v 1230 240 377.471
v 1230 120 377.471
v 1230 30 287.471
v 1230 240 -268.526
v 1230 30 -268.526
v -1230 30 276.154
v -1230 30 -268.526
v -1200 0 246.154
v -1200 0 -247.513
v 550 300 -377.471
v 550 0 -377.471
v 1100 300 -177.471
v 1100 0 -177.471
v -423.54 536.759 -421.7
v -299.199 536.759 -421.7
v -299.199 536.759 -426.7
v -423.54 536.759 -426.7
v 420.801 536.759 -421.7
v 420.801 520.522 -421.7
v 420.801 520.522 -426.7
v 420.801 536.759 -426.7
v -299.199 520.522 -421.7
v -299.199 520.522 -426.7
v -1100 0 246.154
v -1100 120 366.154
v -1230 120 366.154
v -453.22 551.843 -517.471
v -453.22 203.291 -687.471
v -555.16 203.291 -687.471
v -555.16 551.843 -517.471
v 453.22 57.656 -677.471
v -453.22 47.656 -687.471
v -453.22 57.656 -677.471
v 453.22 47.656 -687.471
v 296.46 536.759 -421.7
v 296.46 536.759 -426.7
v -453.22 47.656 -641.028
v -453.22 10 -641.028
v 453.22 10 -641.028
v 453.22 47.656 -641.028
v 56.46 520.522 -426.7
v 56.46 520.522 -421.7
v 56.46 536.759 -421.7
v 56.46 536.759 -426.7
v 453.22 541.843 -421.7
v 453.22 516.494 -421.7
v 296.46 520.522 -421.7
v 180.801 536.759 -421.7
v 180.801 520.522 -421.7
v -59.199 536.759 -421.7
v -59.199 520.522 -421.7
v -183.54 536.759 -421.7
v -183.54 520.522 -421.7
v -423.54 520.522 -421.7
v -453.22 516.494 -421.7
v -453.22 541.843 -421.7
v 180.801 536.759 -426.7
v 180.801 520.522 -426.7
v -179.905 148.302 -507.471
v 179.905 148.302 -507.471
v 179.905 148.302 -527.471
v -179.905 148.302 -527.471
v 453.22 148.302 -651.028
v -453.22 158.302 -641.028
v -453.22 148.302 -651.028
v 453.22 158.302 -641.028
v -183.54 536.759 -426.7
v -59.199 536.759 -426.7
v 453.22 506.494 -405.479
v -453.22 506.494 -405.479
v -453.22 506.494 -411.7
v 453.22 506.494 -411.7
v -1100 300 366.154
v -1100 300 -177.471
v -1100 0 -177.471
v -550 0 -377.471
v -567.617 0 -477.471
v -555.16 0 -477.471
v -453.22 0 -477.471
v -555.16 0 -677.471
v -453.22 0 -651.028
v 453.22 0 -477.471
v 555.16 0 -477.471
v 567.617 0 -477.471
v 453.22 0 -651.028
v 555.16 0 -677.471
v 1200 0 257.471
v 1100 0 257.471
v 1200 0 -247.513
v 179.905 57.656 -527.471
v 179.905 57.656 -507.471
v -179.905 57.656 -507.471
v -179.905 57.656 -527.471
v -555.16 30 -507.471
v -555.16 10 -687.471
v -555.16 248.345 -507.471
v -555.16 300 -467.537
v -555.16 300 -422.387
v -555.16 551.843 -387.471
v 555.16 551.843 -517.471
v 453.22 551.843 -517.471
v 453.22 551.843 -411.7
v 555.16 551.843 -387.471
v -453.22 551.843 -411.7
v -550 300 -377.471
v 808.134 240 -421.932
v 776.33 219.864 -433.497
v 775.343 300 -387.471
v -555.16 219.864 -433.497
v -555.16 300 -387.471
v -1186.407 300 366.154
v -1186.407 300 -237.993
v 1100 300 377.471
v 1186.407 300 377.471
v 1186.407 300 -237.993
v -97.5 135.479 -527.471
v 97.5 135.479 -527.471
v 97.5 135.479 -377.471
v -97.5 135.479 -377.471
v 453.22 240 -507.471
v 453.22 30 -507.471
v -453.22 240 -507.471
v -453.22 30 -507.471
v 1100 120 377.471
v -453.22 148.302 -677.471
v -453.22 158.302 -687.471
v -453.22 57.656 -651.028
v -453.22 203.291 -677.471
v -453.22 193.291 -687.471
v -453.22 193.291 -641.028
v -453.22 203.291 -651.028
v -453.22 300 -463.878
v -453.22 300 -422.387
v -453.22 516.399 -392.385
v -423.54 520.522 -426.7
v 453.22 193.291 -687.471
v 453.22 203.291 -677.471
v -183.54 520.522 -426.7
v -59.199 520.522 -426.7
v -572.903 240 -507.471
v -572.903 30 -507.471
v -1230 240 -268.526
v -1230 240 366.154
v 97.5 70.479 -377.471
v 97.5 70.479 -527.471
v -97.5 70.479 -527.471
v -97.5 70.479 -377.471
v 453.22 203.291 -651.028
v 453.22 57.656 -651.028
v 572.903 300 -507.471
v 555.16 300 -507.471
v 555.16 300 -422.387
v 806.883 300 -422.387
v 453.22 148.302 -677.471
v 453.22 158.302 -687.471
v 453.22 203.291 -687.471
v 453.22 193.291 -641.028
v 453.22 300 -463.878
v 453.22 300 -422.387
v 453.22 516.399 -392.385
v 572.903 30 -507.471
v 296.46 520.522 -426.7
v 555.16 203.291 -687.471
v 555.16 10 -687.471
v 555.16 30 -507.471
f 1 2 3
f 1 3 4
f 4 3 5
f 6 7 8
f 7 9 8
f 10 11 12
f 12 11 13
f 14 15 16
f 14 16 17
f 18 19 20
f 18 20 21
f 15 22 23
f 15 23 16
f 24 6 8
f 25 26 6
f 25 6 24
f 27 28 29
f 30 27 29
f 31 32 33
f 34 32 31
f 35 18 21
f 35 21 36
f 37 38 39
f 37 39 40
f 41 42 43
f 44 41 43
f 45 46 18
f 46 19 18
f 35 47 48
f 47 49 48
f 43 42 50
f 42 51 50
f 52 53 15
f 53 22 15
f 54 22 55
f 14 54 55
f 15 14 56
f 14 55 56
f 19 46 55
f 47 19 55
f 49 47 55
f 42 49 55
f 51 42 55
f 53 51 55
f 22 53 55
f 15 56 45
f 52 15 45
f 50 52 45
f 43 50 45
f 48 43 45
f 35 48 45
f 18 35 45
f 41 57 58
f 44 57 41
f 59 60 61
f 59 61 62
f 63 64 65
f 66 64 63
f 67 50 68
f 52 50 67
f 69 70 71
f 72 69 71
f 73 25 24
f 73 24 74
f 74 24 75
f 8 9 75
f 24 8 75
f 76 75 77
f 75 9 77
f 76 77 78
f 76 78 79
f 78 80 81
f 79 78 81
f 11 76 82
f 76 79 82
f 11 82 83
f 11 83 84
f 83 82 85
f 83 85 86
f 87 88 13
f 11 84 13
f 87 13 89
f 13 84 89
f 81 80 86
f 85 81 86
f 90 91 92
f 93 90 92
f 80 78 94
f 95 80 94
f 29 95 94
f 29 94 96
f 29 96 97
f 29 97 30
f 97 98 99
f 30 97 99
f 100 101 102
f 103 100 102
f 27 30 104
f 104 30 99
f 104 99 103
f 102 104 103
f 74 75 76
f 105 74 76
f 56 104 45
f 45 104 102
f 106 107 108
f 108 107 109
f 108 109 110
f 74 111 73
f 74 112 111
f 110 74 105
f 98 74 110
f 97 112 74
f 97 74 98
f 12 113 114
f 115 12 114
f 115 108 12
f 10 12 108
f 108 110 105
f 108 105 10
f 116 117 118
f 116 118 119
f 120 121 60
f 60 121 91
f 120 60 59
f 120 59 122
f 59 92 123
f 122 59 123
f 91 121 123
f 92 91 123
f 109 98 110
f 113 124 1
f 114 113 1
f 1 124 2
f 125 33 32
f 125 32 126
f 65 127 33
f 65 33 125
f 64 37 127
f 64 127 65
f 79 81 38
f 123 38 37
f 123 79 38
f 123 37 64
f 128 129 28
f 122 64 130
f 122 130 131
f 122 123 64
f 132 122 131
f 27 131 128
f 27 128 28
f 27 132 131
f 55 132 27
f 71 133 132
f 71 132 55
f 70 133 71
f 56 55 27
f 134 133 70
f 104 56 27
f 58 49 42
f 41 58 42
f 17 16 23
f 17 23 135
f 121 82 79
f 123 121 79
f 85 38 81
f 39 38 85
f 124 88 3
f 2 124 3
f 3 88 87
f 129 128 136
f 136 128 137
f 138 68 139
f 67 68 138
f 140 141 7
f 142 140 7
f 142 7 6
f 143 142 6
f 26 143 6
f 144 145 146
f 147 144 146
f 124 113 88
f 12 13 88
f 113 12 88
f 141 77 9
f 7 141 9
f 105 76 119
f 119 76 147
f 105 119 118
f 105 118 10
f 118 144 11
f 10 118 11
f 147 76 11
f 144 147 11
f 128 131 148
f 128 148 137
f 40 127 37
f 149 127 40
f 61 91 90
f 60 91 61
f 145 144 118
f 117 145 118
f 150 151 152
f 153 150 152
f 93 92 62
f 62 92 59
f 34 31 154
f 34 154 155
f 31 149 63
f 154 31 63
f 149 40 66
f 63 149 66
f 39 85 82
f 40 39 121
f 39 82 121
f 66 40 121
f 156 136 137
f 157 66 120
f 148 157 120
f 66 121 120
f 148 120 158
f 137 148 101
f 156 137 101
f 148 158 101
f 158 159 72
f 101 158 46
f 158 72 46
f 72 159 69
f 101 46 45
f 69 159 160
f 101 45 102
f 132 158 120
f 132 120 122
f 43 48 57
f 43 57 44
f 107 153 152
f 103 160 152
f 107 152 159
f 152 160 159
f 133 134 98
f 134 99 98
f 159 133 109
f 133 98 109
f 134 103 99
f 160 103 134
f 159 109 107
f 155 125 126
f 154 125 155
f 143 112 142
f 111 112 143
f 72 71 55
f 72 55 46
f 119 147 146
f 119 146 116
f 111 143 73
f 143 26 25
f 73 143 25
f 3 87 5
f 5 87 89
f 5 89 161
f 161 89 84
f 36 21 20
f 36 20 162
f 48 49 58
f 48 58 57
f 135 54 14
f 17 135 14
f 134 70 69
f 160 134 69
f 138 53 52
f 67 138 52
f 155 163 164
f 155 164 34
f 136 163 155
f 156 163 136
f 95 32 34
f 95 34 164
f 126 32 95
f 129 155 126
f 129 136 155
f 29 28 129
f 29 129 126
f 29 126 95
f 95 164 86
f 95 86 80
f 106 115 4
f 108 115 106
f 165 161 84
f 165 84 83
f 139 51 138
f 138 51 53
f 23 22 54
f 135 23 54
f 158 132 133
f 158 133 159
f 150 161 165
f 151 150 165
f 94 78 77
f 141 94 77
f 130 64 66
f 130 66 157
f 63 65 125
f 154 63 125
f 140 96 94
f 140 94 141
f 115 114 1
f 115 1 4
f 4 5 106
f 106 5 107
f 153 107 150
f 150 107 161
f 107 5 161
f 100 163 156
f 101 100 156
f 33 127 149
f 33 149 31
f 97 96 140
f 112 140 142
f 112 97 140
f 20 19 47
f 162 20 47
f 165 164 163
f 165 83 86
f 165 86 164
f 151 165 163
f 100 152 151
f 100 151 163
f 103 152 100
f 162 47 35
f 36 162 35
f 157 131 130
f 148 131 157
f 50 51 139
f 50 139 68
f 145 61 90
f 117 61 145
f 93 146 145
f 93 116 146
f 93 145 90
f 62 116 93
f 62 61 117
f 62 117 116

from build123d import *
from OCP.BRepFilletAPI import BRepFilletAPI_MakeChamfer

# Parameters (mm, degrees)
BOSS_EXTRUDE1_DEPTH      = 300
CHAMFER1_SIZE            = 30
CHAMFER2_SIZE            = 120
BOSS_EXTRUDE2_DEPTH      = 180
BOSS_EXTRUDE2_DEPTH_BACK = 120
SKETCH3_W                = 101.940118113
SKETCH3_H                = 551.842685694
CUT_EXTRUDE7_DEPTH       = 1991.965553697
CHAMFER3_SIZE            = 170
CHAMFER3_SIZE2           = 348.551653068
SKETCH6_W                = 46.442322401
SKETCH6_H                = 54.989404456
SKETCH6_H_2              = 57.655849519
BOSS_EXTRUDE3_DEPTH      = 906.440509715
CHAMFER5_SIZE            = 10
CHAMFER5_SIZE2           = 11.720638091
SKETCH7_W                = 359.809632682
SKETCH7_H                = 90.64577865
BOSS_EXTRUDE4_DEPTH      = 20
SKETCH8_W                = 195
SKETCH8_H                = 65
CUT_EXTRUDE8_DEPTH       = 392
SKETCH9_W                = 124.341085276
SKETCH9_H                = 16.237188454
BOSS_EXTRUDE5_DEPTH      = 5
CHAMFER6_SIZE            = 60
CHAMFER6_SIZE2           = 43.59255168


with BuildPart() as part:
    # Sketch2 → Boss-Extrude1 (new body)
    with BuildSketch(Plane(origin=(0, 0, 0), x_dir=(1, 0, 0), z_dir=(0, 1, 0))):
        Polygon((-1100, -366.154475502), (-1100, 177.470675031), (-550, 377.470675031), (550, 377.470675031), (1100, 177.470675031), (1100, -377.470675031), (1230, -377.470675031), (1230, 268.52621943), (572.902747098, 507.470675031), (-572.902747098, 507.470675031), (-1230, 268.52621943), (-1230, -366.154475502), align=None)
    extrude(amount=BOSS_EXTRUDE1_DEPTH)

    # Chamfer1
    chamfer1_edges = [part.edges().sort_by_distance(p)[0] for p in [
        (-1230, 0, 48.814128036),
        (-901.451373549, 0, -387.99844723),
        (0, 0, -507.470675031),
        (901.451373549, 0, -387.99844723),
        (1230, 0, 54.4722278),
    ]]
    chamfer(chamfer1_edges, length=CHAMFER1_SIZE)

    # Chamfer2
    chamfer2_edges = [part.edges().sort_by_distance(p)[0] for p in [
        (-1150, 0, 366.154475502),
        (1150, 0, 377.470675031),
    ]]
    chamfer(chamfer2_edges, length=CHAMFER2_SIZE)

    # Sketch3 → Boss-Extrude2 (add, two sides: drawn at the far end of the back side and taken through both)
    with BuildSketch(Plane(origin=(0, 0, -507.470675031), x_dir=(-1, 0, 0), z_dir=(0, 0, -1)).offset(-BOSS_EXTRUDE2_DEPTH_BACK)):
        with Locations((-504.190313915, 275.921342847)):
            Rectangle(SKETCH3_W, SKETCH3_H)
        with Locations((504.190313915, 275.921342847)):
            Rectangle(SKETCH3_W, SKETCH3_H)
    extrude(amount=BOSS_EXTRUDE2_DEPTH + BOSS_EXTRUDE2_DEPTH_BACK)

    # Sketch5 → Cut-Extrude7 (cut, through all)
    with BuildSketch(Plane.ZY.offset(555.160372971)):
        Polygon((-387.470675031, 551.842685694), (-433.497227826, 219.864084998), (-387.470675031, 300), align=None)
    extrude(amount=-CUT_EXTRUDE7_DEPTH, mode=Mode.SUBTRACT)

    # Chamfer3: one chamfer whose edges measure the first distance from different faces: ONE call of the kernel's chamfer builder (chamfer() names one face for all edges)
    chamfer3_edges_1 = [part.edges().sort_by_distance(p)[0] for p in [
        (-504.190313915, 551.842685694, -687.470675031),
    ]]
    chamfer3_side_1 = [part.faces().sort_by_distance(p)[0] for p in [
        (-504.190313915, 551.842685694, -537.470675031),
    ]]
    chamfer3_edges_2 = [part.edges().sort_by_distance(p)[0] for p in [
        (504.190313915, 551.842685694, -687.470675031),
    ]]
    chamfer3_side_2 = [part.faces().sort_by_distance(p)[0] for p in [
        (504.190313915, 551.842685694, -537.470675031),
    ]]
    chamfer3 = BRepFilletAPI_MakeChamfer(part.part.solid().wrapped)
    for e in chamfer3_edges_1:
        chamfer3.Add(CHAMFER3_SIZE, CHAMFER3_SIZE2, e.wrapped, chamfer3_side_1[0].wrapped)  # the first distance lies on this face
    for e in chamfer3_edges_2:
        chamfer3.Add(CHAMFER3_SIZE, CHAMFER3_SIZE2, e.wrapped, chamfer3_side_2[0].wrapped)  # the first distance lies on this face
    add(Compound.cast(chamfer3.Shape()), mode=Mode.REPLACE)

    # Sketch6 → Boss-Extrude3 (add)
    with BuildSketch(Plane(origin=(-453.220254858, 0, 0), x_dir=(0, 0, -1), z_dir=(1, 0, 0))):
        Polygon((387.470675031, 551.842685694), (393.758008235, 506.493643621), (421.699837769, 506.493643621), (421.699837769, 551.842685694), align=None)
        with Locations((664.249513831, 175.796330397)):
            Rectangle(SKETCH6_W, SKETCH6_H)
        with Locations((664.249513831, 28.82792476)):
            Rectangle(SKETCH6_W, SKETCH6_H_2)
    extrude(amount=BOSS_EXTRUDE3_DEPTH)

    # Chamfer5: one chamfer whose edges measure the first distance from different faces: ONE call of the kernel's chamfer builder (chamfer() names one face for all edges)
    chamfer5_edges_1 = [part.edges().sort_by_distance(p)[0] for p in [
        (0, 506.493643621, -421.699837769),
        (0, 551.842685694, -421.699837769),
        (0, 148.301628169, -641.02835263),
        (0, 203.291032625, -641.02835263),
        (0, 203.291032625, -687.470675031),
        (0, 148.301628169, -687.470675031),
        (0, 0, -641.02835263),
        (0, 57.655849519, -641.02835263),
        (0, 57.655849519, -687.470675031),
        (0, 0, -687.470675031),
    ]]
    chamfer5_edges_2 = [part.edges().sort_by_distance(p)[0] for p in [
        (0, 506.493643621, -393.758008235),
    ]]
    chamfer5_side_2 = [part.faces().sort_by_distance(p)[0] for p in [
        (-541.133646758, 425.921342847, -404.928804327),
    ]]
    chamfer5 = BRepFilletAPI_MakeChamfer(part.part.solid().wrapped)
    for e in chamfer5_edges_1:
        chamfer5.Add(CHAMFER5_SIZE, e.wrapped)
    for e in chamfer5_edges_2:
        chamfer5.Add(CHAMFER5_SIZE, CHAMFER5_SIZE2, e.wrapped, chamfer5_side_2[0].wrapped)  # the first distance lies on this face
    add(Compound.cast(chamfer5.Shape()), mode=Mode.REPLACE)

    # Sketch7 → Boss-Extrude4 (add)
    with BuildSketch(Plane(origin=(0, 0, -507.470675031), x_dir=(-1, 0, 0), z_dir=(0, 0, -1))):
        with Locations((0, 102.978738844)):
            Rectangle(SKETCH7_W, SKETCH7_H)
    extrude(amount=BOSS_EXTRUDE4_DEPTH)

    # Sketch8 → Cut-Extrude8 (cut)
    with BuildSketch(Plane(origin=(0, 0, -527.470675031), x_dir=(-1, 0, 0), z_dir=(0, 0, -1))):
        with Locations((0, 102.978738844)):
            Rectangle(SKETCH8_W, SKETCH8_H)
    extrude(amount=-CUT_EXTRUDE8_DEPTH, mode=Mode.SUBTRACT)

    # Sketch9 → Boss-Extrude5 (add)
    with BuildSketch(Plane(origin=(0, 0, -421.699837769), x_dir=(-1, 0, 0), z_dir=(0, 0, -1))):
        with Locations((-358.63050058, 528.640825731)):
            Rectangle(SKETCH9_W, SKETCH9_H)
        with Locations((-118.63050058, 528.640825731)):
            Rectangle(SKETCH9_W, SKETCH9_H)
        with Locations((121.36949942, 528.640825731)):
            Rectangle(SKETCH9_W, SKETCH9_H)
        with Locations((361.36949942, 528.640825731)):
            Rectangle(SKETCH9_W, SKETCH9_H)
    extrude(amount=BOSS_EXTRUDE5_DEPTH)

    # Chamfer6: one chamfer whose edges measure the first distance from different faces: ONE call of the kernel's chamfer builder (chamfer() names one face for all edges)
    chamfer6_edges_1 = [part.edges().sort_by_distance(p)[0] for p in [
        (-1230, 300, 48.814128036),
    ]]
    chamfer6_side_1 = [part.faces().sort_by_distance(p)[0] for p in [
        (-1230, 167.541631542, 41.858763366),
    ]]
    chamfer6_edges_2 = [part.edges().sort_by_distance(p)[0] for p in [
        (-901.451373549, 300, -387.99844723),
    ]]
    chamfer6_side_2 = [part.faces().sort_by_distance(p)[0] for p in [
        (-901.451373549, 165, -387.99844723),
    ]]
    chamfer6_edges_3 = [part.edges().sort_by_distance(p)[0] for p in [
        (0, 300, -507.470675031),
    ]]
    chamfer6_side_3 = [part.faces().sort_by_distance(p)[0] for p in [
        (0, 174.536120756, -507.470675031),
    ]]
    chamfer6_edges_4 = [part.edges().sort_by_distance(p)[0] for p in [
        (1066.451373549, 300, -327.99844723),
    ]]
    chamfer6_side_4 = [part.faces().sort_by_distance(p)[0] for p in [
        (903.063859392, 162.599697247, -387.412088742),
    ]]
    chamfer6_edges_5 = [part.edges().sort_by_distance(p)[0] for p in [
        (1230, 300, 54.4722278),
    ]]
    chamfer6_side_5 = [part.faces().sort_by_distance(p)[0] for p in [
        (1230, 167.496050319, 47.507095726),
    ]]
    chamfer6 = BRepFilletAPI_MakeChamfer(part.part.solid().wrapped)
    for e in chamfer6_edges_1:
        chamfer6.Add(CHAMFER6_SIZE, CHAMFER6_SIZE2, e.wrapped, chamfer6_side_1[0].wrapped)  # the first distance lies on this face
    for e in chamfer6_edges_2:
        chamfer6.Add(CHAMFER6_SIZE, CHAMFER6_SIZE2, e.wrapped, chamfer6_side_2[0].wrapped)  # the first distance lies on this face
    for e in chamfer6_edges_3:
        chamfer6.Add(CHAMFER6_SIZE, CHAMFER6_SIZE2, e.wrapped, chamfer6_side_3[0].wrapped)  # the first distance lies on this face
    for e in chamfer6_edges_4:
        chamfer6.Add(CHAMFER6_SIZE, CHAMFER6_SIZE2, e.wrapped, chamfer6_side_4[0].wrapped)  # the first distance lies on this face
    for e in chamfer6_edges_5:
        chamfer6.Add(CHAMFER6_SIZE, CHAMFER6_SIZE2, e.wrapped, chamfer6_side_5[0].wrapped)  # the first distance lies on this face
    add(Compound.cast(chamfer6.Shape()), mode=Mode.REPLACE)


solid = part.part
